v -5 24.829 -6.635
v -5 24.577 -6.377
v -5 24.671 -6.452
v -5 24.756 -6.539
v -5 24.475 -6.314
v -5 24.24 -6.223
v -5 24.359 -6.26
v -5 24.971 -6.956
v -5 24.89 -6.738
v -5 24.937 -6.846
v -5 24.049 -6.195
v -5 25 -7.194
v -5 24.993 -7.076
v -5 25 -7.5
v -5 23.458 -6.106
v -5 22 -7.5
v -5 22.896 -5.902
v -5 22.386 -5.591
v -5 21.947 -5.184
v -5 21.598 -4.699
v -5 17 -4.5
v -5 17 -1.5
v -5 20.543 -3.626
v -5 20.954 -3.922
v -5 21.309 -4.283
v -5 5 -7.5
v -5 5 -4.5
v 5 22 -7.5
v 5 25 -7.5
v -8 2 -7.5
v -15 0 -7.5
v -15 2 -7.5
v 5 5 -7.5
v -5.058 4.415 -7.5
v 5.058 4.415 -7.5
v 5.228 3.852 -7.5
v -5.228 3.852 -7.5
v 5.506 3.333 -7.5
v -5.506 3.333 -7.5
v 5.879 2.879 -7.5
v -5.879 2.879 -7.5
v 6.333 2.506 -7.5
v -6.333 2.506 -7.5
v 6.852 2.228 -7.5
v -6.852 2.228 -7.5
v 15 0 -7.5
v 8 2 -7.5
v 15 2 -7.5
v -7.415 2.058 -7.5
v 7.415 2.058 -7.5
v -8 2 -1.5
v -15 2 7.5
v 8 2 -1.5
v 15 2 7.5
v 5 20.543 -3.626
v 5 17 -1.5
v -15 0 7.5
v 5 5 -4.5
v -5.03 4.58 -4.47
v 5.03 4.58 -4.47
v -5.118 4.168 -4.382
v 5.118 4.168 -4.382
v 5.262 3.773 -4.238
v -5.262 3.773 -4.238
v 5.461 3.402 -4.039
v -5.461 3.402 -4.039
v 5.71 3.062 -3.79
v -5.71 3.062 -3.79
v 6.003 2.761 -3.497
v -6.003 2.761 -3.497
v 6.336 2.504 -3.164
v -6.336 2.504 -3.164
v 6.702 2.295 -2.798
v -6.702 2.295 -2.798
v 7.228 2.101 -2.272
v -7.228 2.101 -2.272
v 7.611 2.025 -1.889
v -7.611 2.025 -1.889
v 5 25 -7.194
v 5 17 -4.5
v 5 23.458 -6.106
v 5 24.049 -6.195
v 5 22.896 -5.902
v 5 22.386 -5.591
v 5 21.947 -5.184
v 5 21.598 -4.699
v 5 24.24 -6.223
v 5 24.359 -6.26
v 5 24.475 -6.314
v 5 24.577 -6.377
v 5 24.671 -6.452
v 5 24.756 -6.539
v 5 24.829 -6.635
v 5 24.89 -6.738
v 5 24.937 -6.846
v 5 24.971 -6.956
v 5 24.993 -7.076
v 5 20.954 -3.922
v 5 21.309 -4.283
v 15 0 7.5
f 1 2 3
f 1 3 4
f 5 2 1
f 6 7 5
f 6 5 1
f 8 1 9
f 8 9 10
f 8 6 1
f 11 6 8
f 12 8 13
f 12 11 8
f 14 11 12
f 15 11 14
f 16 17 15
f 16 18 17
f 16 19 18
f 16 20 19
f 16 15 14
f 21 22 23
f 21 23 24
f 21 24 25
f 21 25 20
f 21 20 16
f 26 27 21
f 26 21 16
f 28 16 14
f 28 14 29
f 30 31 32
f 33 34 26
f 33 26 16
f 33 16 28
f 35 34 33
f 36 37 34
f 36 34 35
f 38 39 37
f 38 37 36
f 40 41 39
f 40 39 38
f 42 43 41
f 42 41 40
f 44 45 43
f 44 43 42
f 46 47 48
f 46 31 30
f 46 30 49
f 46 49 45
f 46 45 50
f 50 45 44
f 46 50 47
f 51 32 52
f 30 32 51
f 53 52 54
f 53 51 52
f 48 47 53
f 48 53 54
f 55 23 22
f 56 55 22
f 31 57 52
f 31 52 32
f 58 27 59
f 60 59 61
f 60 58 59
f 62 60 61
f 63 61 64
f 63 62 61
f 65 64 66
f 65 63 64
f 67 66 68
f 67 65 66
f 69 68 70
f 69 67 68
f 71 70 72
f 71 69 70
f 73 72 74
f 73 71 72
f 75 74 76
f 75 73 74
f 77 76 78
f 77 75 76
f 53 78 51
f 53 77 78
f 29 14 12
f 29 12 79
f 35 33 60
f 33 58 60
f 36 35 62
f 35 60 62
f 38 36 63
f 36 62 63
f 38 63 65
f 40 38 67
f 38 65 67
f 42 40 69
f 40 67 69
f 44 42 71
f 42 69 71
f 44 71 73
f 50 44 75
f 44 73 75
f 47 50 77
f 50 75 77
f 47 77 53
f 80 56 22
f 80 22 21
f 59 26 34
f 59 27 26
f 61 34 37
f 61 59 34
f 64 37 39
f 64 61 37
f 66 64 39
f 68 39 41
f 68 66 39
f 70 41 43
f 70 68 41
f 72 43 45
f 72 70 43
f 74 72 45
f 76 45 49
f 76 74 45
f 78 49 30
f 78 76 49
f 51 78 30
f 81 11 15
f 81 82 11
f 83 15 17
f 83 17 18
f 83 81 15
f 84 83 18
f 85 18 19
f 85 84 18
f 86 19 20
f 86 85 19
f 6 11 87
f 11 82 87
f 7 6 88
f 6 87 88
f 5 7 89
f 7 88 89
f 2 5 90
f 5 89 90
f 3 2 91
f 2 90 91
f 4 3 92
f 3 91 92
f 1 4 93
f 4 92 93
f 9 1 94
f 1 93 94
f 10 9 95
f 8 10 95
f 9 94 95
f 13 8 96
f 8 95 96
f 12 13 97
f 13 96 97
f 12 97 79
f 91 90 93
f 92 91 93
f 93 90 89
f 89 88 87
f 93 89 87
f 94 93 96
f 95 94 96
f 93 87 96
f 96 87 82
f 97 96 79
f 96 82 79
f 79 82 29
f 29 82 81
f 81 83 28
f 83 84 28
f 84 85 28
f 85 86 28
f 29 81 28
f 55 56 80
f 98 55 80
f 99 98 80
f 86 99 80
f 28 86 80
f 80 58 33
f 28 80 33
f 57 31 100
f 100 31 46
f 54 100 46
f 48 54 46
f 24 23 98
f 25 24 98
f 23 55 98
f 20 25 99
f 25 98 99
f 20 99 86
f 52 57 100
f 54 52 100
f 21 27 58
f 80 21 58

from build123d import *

# Parameters (mm, degrees)
SKETCH_1_W      = 30
SKETCH_1_H      = 15
EXTRUDE_1_DEPTH = 2
SKETCH_2_W      = 10
SKETCH_2_H      = 3
EXTRUDE_2_DEPTH = 20
EXTRUDE_3_DEPTH = 10
FILLET_2_R      = 3
FILLET_3_R      = 3
FILLET_4_R      = 3
SKETCH_5_W      = 10
SKETCH_5_H      = 1.301428863
EXTRUDE_4_DEPTH = 3
FILLET_5_R      = 3
FILLET_6_R      = 1


with BuildPart() as part:
    # Эскиз1 → Бобышка-Вытянуть1 (new body)
    with BuildSketch(Plane(origin=(0, 0, 0), x_dir=(1, 0, 0), z_dir=(0, 1, 0))):
        Rectangle(SKETCH_1_W, SKETCH_1_H)
    extrude(amount=EXTRUDE_1_DEPTH)

    # Эскиз2 → Бобышка-Вытянуть2 (add)
    with BuildSketch(Plane(origin=(0, 2, 0), x_dir=(1, 0, 0), z_dir=(0, 1, 0))):
        with Locations((0, 6)):
            Rectangle(SKETCH_2_W, SKETCH_2_H)
    extrude(amount=EXTRUDE_2_DEPTH)

    # Эскиз3 → Бобышка-Вытянуть3 (add)
    with BuildSketch(Plane.ZY.offset(5)):
        Polygon((-4.5, 22), (-1.5, 17), (-4.5, 17), align=None)
    extrude(amount=-EXTRUDE_3_DEPTH)

    # Скругление2
    fillet_2_edges = [part.edges().sort_by_distance(p)[0] for p in [
        (0, 22, -4.5),
    ]]
    fillet(fillet_2_edges, radius=FILLET_2_R)

    # Скругление3
    fillet_3_edges = [part.edges().sort_by_distance(p)[0] for p in [
        (0, 2, -4.5),
    ]]
    fillet(fillet_3_edges, radius=FILLET_3_R)

    # Скругление4
    fillet_4_edges = [part.edges().sort_by_distance(p)[0] for p in [
        (-5, 2, -4.5),
        (5, 2, -4.5),
    ]]
    fillet(fillet_4_edges, radius=FILLET_4_R)

    # Эскиз5 → Бобышка-Вытянуть4 (add)
    with BuildSketch(Plane(origin=(0, 22, 0), x_dir=(1, 0, 0), z_dir=(0, 1, 0))):
        with Locations((0, 6.849285569)):
            Rectangle(SKETCH_5_W, SKETCH_5_H)
    extrude(amount=EXTRUDE_4_DEPTH)

    # Скругление5
    fillet_5_edges = [part.edges().sort_by_distance(p)[0] for p in [
        (0, 22, -6.198571137),
    ]]
    fillet(fillet_5_edges, radius=FILLET_5_R)

    # Скругление6
    fillet_6_edges = [part.edges().sort_by_distance(p)[0] for p in [
        (0, 25, -6.198571137),
    ]]
    fillet(fillet_6_edges, radius=FILLET_6_R)


solid = part.part
